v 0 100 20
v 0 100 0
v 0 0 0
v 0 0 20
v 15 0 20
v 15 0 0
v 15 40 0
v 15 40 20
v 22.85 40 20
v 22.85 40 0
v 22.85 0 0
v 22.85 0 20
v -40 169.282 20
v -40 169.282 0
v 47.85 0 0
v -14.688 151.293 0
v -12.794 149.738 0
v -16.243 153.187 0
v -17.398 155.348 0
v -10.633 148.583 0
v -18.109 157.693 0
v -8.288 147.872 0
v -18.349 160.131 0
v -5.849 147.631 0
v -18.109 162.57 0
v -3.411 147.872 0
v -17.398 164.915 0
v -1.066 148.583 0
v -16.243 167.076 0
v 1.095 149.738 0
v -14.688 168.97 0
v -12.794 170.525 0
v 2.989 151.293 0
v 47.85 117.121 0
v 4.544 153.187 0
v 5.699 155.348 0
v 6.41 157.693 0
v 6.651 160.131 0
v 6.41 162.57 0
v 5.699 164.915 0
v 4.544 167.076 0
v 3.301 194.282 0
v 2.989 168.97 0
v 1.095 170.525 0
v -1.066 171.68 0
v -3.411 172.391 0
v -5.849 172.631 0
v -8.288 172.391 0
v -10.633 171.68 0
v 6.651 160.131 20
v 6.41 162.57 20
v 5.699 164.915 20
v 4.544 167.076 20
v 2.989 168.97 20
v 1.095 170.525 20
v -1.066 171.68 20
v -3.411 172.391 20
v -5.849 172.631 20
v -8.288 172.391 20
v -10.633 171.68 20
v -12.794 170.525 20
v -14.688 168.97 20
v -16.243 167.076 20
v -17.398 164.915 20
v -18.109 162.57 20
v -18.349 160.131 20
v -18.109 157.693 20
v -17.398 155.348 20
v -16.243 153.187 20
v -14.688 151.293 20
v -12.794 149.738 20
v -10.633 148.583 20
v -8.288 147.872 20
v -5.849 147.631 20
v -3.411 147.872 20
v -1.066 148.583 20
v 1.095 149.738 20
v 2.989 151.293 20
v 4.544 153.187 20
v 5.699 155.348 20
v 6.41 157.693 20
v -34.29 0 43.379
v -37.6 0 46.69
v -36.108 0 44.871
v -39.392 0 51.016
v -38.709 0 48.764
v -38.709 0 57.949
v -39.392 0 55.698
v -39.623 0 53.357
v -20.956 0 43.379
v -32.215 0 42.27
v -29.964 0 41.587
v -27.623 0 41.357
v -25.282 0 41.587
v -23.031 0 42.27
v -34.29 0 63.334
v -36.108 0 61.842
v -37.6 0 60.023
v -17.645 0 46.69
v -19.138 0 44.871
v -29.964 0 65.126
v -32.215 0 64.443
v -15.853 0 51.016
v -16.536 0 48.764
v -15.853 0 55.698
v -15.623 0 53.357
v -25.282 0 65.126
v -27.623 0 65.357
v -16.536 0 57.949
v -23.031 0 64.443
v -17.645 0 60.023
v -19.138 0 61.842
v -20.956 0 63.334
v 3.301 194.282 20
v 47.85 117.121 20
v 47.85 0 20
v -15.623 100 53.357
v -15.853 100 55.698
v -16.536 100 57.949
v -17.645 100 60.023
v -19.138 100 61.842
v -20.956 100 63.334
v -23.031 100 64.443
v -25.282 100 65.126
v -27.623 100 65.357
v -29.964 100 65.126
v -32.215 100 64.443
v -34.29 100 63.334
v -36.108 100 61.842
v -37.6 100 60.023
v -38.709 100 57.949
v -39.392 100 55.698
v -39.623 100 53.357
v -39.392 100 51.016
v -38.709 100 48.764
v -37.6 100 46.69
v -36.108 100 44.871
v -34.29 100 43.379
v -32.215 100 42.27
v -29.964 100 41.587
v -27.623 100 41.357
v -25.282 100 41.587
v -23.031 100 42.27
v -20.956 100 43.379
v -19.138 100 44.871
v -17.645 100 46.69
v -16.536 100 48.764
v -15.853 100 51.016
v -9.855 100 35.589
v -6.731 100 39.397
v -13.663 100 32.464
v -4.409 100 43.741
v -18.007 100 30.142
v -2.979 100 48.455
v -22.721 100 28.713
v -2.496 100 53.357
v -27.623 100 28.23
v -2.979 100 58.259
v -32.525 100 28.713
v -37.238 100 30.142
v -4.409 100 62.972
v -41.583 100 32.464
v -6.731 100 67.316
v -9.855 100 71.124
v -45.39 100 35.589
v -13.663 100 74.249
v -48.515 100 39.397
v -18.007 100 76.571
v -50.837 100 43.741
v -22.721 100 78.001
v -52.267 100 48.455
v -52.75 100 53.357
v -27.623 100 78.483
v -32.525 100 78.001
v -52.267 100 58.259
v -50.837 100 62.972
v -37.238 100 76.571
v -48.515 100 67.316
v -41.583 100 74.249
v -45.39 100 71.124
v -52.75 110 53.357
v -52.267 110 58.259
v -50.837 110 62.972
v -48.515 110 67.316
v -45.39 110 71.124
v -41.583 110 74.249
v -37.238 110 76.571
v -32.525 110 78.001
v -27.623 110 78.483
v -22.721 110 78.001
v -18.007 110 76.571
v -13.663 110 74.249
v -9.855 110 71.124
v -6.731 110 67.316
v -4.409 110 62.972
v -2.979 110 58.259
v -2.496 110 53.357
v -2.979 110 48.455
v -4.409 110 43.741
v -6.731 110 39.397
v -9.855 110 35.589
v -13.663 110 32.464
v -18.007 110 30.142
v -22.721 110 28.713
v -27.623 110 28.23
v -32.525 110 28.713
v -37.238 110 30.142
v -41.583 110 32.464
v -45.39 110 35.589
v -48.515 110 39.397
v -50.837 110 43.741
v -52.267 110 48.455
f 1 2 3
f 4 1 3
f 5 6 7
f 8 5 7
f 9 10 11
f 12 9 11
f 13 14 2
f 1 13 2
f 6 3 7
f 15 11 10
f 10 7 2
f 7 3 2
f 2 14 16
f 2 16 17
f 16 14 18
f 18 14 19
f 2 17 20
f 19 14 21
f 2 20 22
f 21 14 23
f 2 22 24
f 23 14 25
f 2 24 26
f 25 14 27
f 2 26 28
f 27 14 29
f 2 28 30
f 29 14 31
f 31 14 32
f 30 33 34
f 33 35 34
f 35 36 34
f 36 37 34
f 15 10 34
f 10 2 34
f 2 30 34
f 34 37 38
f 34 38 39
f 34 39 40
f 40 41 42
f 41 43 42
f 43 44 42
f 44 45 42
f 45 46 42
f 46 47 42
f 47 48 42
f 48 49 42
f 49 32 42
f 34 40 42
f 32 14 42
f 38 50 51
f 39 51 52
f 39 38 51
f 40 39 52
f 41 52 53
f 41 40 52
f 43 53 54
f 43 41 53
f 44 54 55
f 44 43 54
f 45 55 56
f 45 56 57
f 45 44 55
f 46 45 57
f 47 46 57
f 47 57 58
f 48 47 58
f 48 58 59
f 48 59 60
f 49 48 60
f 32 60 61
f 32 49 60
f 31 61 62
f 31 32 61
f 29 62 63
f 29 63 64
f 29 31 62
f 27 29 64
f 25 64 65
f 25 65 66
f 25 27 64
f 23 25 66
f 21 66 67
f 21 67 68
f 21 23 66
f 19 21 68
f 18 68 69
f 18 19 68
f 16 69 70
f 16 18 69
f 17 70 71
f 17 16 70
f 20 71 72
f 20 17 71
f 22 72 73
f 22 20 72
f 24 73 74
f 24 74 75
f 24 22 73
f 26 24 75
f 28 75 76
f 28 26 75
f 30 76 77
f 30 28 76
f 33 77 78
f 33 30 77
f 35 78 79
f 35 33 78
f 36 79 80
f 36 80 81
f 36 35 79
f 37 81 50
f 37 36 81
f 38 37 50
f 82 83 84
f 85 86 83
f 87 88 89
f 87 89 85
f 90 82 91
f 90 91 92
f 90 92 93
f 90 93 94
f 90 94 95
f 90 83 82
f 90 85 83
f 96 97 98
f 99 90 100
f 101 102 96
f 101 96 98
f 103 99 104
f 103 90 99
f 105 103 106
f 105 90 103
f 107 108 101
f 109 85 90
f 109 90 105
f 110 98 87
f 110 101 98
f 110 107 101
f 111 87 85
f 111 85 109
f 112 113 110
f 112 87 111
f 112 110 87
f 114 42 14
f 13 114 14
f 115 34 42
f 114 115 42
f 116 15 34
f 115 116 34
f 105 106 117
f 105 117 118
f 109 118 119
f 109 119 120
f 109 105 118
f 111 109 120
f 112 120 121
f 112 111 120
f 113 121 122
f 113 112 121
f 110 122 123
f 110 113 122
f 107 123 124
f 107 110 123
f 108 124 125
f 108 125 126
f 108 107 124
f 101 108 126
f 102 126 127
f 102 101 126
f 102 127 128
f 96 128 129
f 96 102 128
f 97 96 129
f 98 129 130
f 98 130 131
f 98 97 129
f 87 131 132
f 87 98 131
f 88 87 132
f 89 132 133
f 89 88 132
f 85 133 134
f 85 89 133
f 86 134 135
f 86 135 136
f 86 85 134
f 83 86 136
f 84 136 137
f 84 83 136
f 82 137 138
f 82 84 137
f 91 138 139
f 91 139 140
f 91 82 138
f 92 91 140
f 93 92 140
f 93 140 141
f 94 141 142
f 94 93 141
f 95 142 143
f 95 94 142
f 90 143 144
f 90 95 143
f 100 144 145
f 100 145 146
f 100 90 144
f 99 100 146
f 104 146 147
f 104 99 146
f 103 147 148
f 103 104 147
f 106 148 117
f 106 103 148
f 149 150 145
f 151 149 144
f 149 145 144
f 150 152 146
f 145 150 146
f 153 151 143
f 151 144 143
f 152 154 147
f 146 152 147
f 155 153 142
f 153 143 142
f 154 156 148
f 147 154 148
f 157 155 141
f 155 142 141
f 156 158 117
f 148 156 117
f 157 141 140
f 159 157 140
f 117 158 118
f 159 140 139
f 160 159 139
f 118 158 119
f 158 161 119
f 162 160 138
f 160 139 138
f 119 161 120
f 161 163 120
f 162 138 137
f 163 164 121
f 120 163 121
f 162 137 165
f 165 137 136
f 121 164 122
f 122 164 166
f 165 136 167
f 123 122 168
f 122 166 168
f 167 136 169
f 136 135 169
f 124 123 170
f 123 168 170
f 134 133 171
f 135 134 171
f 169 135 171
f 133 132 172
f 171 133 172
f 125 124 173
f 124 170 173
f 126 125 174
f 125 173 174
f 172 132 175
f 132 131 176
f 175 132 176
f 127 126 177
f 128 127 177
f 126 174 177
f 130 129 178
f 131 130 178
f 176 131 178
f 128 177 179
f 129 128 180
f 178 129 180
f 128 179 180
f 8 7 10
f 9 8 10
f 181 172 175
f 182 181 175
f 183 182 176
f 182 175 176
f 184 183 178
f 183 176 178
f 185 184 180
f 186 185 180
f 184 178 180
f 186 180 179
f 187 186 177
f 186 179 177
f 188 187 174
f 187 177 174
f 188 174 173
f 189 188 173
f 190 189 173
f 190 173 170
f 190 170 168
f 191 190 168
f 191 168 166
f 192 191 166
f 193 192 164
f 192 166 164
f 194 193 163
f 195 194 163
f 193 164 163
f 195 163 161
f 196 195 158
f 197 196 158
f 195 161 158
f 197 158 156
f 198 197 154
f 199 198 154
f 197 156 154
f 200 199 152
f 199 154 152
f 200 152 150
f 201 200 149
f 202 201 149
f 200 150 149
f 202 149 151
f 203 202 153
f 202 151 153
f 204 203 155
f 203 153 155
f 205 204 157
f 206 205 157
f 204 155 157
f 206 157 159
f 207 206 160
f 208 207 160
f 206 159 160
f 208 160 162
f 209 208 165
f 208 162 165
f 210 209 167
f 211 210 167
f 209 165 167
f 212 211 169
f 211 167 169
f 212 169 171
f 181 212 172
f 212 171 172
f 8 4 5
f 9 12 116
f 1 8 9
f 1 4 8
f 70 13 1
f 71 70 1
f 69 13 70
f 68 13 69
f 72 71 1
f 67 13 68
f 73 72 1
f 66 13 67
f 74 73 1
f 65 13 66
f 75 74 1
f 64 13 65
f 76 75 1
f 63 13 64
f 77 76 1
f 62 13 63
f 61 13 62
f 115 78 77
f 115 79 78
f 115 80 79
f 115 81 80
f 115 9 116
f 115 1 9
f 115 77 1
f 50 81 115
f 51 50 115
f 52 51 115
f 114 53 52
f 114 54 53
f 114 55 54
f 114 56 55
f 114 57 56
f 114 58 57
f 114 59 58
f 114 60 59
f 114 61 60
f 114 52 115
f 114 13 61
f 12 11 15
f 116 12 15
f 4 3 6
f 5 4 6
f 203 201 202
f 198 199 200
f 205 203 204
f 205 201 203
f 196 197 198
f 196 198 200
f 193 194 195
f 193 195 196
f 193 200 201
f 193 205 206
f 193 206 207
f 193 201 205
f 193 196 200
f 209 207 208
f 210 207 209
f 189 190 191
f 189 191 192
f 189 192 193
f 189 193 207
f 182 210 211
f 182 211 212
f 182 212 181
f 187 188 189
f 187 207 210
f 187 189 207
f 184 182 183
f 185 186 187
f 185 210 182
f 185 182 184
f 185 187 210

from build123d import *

# Parameters (mm, degrees)
F0_R     = 12.5
F1_DEPTH = 20
F2_R     = 12
F3_DEPTH = 100
F4_R     = 25.126873
F5_DEPTH = 10


with BuildPart() as f1:
    # F0 (on Top) → F1 (new body)
    with BuildSketch(Plane.XY):
        Polygon((0, 100), (0, 0), (15, 0), (15, 40), (22.85, 40), (22.85, 0), (47.85, 0), (47.85, 117.121369), (3.30127, 194.282032), (-40, 169.282032), align=None)
        with Locations((-5.849365, 160.131397)):
            Circle(F0_R, mode=Mode.SUBTRACT)
    extrude(amount=F1_DEPTH)


with BuildPart() as f3:
    # F2 (on Front) → F3 (new body)
    with BuildSketch(Plane.XZ):
        with Locations((-27.622849, 53.356603)):
            Circle(F2_R)
    extrude(amount=-F3_DEPTH)

    # F4 (on face) → F5 (join)
    with BuildSketch(Plane(origin=(0, 100, 0), x_dir=(-1, 0, 0), z_dir=(0, 1, 0))):
        with Locations((27.622849, 53.356603)):
            Circle(F4_R)
    extrude(amount=F5_DEPTH)


solid = Compound([f1.part, f3.part])
